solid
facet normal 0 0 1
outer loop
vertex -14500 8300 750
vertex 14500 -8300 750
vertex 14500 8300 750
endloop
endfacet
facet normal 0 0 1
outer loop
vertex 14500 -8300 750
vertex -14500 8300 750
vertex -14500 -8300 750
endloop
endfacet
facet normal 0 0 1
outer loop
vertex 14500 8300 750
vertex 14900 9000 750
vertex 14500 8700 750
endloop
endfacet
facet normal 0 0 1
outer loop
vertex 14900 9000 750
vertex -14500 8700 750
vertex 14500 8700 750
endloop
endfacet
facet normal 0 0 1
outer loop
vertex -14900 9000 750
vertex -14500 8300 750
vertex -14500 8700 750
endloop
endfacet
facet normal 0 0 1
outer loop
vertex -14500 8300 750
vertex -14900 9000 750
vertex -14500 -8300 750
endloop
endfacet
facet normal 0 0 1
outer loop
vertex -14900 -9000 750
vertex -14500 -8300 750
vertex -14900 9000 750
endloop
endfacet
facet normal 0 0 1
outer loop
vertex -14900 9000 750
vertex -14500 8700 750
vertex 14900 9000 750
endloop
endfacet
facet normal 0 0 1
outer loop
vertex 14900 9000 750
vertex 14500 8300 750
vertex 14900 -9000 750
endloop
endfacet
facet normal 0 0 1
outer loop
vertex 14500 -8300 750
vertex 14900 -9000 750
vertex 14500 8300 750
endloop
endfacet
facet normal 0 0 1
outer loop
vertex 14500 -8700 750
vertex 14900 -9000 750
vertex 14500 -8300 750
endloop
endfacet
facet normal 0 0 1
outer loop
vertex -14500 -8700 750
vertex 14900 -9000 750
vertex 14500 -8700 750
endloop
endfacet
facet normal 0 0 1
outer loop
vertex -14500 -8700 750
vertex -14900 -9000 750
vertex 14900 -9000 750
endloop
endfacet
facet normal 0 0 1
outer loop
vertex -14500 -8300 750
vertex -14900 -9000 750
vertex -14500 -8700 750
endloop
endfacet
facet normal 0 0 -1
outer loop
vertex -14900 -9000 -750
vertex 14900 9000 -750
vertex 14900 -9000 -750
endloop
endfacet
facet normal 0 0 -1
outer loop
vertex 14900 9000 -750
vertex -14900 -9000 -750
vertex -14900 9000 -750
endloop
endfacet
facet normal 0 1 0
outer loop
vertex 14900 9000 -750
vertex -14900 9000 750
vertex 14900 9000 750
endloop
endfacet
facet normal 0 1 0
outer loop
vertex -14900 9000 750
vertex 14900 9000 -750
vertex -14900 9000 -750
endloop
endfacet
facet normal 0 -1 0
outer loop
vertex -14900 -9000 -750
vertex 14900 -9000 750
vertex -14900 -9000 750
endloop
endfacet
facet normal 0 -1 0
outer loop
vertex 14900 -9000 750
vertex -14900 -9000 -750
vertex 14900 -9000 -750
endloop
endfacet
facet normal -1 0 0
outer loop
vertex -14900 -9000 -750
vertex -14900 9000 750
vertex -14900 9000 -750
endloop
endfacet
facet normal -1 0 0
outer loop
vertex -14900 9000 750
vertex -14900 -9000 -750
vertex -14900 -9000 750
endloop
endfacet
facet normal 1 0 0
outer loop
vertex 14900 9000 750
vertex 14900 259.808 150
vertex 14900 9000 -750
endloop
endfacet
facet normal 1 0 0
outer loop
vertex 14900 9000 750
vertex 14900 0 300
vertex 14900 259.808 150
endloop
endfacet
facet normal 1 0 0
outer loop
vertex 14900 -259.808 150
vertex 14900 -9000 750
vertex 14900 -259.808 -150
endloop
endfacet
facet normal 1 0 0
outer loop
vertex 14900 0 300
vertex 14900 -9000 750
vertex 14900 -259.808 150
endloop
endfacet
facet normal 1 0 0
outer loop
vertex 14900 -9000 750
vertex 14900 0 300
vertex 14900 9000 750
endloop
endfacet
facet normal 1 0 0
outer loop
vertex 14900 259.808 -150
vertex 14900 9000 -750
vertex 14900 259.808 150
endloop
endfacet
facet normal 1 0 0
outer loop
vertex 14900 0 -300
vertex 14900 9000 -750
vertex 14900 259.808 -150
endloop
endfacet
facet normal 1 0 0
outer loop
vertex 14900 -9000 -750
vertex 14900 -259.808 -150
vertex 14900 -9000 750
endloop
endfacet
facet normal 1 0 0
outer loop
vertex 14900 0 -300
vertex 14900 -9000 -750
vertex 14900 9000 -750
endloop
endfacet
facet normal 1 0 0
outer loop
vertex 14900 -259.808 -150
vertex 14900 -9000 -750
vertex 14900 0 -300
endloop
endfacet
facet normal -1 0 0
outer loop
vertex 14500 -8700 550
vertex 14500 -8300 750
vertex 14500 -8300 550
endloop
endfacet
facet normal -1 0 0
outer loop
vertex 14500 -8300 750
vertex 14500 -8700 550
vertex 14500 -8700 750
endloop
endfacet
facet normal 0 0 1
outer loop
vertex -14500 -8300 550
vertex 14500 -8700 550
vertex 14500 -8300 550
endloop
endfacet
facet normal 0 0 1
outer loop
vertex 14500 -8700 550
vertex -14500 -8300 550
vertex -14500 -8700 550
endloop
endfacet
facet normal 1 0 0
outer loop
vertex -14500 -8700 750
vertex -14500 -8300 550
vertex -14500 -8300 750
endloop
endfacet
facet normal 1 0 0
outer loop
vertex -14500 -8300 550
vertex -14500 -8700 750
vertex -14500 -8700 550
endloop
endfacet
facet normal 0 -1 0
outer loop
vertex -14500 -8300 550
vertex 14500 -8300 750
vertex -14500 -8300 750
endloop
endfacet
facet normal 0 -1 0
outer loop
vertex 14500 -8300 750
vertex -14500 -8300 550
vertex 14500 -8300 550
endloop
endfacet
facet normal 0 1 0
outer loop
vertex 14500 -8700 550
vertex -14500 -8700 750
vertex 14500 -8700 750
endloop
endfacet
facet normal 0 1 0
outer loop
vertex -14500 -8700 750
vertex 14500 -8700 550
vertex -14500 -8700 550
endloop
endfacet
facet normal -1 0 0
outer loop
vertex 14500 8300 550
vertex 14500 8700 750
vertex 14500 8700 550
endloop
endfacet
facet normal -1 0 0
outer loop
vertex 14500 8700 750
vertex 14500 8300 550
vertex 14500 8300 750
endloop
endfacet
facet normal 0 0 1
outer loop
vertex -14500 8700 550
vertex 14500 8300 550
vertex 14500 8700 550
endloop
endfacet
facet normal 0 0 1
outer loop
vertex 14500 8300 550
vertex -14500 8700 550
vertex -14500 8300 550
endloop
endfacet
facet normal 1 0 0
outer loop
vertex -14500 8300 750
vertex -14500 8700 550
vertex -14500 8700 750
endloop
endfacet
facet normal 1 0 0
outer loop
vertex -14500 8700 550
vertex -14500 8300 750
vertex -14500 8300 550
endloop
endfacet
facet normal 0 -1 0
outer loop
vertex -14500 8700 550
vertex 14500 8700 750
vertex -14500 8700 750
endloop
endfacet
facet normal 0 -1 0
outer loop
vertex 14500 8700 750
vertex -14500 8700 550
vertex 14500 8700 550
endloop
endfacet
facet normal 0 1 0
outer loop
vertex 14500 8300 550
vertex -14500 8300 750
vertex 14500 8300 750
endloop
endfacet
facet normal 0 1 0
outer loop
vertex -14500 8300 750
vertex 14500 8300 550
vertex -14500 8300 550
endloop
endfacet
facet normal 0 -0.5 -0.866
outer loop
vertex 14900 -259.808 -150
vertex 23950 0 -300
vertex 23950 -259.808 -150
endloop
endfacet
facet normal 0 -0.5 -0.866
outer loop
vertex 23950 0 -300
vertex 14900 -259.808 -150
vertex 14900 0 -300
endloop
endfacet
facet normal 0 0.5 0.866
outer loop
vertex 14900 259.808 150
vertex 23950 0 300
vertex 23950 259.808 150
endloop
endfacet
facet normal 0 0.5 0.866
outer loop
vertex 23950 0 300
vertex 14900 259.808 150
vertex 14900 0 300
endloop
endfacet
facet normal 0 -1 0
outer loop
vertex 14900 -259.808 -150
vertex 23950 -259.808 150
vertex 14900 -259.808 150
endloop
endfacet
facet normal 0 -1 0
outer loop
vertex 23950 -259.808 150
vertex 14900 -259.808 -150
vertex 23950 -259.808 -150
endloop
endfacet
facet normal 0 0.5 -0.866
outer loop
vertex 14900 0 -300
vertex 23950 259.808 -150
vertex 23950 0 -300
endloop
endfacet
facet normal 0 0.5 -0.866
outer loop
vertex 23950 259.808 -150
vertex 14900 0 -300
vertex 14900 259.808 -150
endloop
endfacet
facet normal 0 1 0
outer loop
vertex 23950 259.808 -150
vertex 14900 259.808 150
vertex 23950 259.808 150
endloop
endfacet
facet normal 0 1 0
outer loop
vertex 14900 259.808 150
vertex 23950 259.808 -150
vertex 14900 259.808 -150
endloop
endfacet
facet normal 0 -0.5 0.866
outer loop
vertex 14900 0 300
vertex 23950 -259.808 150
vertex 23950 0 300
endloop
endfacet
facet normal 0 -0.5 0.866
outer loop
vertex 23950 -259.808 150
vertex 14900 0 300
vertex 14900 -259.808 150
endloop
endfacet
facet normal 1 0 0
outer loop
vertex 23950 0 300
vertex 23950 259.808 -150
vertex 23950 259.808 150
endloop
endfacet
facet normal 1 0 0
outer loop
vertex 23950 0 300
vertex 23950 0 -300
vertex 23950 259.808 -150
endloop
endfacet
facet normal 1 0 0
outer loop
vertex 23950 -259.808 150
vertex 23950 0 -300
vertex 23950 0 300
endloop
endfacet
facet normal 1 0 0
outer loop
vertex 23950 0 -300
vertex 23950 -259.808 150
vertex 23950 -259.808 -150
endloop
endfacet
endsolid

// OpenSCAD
// =========================================================================
// GRUMMAN-STYLED EMERGENCY INFLATABLE CARRIER - FLATBED FLUSH-DECK PLATFORM
// MANUFACTURER: HUNTINGTON INGALLS / NEWPORT NEWS SHIPBUILDING
// MECHANICAL BLUEPRINT SPECIFICATION: ACCORDION LANDING PLATFORM
// =========================================================================

module carrier_plate_module(length=30000, width=18000, thickness=1500) {
    difference() {
        // Main Flatbed Drop-Stitch Slab Core (No Tower, No Turret Obstructions)
        cube([length, width, thickness], center=true);
        
        // Passive Hinge Clearances for Accordion-Style Stacking
        translate([-length/2, 0, 0])
            cube([200, width+10, thickness+10], center=true);
        translate([length/2, 0, 0])
            cube([200, width+10, thickness+10], center=true);
            
        // Integrated Low-Profile Left/Right Sump Trenches for Bilge Collection
        translate([0, -width/2 + 500, thickness/2 - 100])
            cube([length - 1000, 400, 200], center=true);
        translate([0, width/2 - 500, thickness/2 - 100])
            cube([length - 1000, 400, 200], center=true);
    }
    
    // Huntington Ingalls Gravity-Drop Tongue-and-Groove Passive Interlocks
    translate([length/2 - 50, 0, 0])
        tongue_interlock_joint(width);
}

module tongue_interlock_joint(joint_width) {
    // Solid wedge joint profile that jams locked under gravity drop action
    rotate([0, 90, 0])
        cylinder(h=100, r=300, h=joint_width, center=true, $fn=6);
}

// Render primary operational flatbed segment
carrier_plate_module();
